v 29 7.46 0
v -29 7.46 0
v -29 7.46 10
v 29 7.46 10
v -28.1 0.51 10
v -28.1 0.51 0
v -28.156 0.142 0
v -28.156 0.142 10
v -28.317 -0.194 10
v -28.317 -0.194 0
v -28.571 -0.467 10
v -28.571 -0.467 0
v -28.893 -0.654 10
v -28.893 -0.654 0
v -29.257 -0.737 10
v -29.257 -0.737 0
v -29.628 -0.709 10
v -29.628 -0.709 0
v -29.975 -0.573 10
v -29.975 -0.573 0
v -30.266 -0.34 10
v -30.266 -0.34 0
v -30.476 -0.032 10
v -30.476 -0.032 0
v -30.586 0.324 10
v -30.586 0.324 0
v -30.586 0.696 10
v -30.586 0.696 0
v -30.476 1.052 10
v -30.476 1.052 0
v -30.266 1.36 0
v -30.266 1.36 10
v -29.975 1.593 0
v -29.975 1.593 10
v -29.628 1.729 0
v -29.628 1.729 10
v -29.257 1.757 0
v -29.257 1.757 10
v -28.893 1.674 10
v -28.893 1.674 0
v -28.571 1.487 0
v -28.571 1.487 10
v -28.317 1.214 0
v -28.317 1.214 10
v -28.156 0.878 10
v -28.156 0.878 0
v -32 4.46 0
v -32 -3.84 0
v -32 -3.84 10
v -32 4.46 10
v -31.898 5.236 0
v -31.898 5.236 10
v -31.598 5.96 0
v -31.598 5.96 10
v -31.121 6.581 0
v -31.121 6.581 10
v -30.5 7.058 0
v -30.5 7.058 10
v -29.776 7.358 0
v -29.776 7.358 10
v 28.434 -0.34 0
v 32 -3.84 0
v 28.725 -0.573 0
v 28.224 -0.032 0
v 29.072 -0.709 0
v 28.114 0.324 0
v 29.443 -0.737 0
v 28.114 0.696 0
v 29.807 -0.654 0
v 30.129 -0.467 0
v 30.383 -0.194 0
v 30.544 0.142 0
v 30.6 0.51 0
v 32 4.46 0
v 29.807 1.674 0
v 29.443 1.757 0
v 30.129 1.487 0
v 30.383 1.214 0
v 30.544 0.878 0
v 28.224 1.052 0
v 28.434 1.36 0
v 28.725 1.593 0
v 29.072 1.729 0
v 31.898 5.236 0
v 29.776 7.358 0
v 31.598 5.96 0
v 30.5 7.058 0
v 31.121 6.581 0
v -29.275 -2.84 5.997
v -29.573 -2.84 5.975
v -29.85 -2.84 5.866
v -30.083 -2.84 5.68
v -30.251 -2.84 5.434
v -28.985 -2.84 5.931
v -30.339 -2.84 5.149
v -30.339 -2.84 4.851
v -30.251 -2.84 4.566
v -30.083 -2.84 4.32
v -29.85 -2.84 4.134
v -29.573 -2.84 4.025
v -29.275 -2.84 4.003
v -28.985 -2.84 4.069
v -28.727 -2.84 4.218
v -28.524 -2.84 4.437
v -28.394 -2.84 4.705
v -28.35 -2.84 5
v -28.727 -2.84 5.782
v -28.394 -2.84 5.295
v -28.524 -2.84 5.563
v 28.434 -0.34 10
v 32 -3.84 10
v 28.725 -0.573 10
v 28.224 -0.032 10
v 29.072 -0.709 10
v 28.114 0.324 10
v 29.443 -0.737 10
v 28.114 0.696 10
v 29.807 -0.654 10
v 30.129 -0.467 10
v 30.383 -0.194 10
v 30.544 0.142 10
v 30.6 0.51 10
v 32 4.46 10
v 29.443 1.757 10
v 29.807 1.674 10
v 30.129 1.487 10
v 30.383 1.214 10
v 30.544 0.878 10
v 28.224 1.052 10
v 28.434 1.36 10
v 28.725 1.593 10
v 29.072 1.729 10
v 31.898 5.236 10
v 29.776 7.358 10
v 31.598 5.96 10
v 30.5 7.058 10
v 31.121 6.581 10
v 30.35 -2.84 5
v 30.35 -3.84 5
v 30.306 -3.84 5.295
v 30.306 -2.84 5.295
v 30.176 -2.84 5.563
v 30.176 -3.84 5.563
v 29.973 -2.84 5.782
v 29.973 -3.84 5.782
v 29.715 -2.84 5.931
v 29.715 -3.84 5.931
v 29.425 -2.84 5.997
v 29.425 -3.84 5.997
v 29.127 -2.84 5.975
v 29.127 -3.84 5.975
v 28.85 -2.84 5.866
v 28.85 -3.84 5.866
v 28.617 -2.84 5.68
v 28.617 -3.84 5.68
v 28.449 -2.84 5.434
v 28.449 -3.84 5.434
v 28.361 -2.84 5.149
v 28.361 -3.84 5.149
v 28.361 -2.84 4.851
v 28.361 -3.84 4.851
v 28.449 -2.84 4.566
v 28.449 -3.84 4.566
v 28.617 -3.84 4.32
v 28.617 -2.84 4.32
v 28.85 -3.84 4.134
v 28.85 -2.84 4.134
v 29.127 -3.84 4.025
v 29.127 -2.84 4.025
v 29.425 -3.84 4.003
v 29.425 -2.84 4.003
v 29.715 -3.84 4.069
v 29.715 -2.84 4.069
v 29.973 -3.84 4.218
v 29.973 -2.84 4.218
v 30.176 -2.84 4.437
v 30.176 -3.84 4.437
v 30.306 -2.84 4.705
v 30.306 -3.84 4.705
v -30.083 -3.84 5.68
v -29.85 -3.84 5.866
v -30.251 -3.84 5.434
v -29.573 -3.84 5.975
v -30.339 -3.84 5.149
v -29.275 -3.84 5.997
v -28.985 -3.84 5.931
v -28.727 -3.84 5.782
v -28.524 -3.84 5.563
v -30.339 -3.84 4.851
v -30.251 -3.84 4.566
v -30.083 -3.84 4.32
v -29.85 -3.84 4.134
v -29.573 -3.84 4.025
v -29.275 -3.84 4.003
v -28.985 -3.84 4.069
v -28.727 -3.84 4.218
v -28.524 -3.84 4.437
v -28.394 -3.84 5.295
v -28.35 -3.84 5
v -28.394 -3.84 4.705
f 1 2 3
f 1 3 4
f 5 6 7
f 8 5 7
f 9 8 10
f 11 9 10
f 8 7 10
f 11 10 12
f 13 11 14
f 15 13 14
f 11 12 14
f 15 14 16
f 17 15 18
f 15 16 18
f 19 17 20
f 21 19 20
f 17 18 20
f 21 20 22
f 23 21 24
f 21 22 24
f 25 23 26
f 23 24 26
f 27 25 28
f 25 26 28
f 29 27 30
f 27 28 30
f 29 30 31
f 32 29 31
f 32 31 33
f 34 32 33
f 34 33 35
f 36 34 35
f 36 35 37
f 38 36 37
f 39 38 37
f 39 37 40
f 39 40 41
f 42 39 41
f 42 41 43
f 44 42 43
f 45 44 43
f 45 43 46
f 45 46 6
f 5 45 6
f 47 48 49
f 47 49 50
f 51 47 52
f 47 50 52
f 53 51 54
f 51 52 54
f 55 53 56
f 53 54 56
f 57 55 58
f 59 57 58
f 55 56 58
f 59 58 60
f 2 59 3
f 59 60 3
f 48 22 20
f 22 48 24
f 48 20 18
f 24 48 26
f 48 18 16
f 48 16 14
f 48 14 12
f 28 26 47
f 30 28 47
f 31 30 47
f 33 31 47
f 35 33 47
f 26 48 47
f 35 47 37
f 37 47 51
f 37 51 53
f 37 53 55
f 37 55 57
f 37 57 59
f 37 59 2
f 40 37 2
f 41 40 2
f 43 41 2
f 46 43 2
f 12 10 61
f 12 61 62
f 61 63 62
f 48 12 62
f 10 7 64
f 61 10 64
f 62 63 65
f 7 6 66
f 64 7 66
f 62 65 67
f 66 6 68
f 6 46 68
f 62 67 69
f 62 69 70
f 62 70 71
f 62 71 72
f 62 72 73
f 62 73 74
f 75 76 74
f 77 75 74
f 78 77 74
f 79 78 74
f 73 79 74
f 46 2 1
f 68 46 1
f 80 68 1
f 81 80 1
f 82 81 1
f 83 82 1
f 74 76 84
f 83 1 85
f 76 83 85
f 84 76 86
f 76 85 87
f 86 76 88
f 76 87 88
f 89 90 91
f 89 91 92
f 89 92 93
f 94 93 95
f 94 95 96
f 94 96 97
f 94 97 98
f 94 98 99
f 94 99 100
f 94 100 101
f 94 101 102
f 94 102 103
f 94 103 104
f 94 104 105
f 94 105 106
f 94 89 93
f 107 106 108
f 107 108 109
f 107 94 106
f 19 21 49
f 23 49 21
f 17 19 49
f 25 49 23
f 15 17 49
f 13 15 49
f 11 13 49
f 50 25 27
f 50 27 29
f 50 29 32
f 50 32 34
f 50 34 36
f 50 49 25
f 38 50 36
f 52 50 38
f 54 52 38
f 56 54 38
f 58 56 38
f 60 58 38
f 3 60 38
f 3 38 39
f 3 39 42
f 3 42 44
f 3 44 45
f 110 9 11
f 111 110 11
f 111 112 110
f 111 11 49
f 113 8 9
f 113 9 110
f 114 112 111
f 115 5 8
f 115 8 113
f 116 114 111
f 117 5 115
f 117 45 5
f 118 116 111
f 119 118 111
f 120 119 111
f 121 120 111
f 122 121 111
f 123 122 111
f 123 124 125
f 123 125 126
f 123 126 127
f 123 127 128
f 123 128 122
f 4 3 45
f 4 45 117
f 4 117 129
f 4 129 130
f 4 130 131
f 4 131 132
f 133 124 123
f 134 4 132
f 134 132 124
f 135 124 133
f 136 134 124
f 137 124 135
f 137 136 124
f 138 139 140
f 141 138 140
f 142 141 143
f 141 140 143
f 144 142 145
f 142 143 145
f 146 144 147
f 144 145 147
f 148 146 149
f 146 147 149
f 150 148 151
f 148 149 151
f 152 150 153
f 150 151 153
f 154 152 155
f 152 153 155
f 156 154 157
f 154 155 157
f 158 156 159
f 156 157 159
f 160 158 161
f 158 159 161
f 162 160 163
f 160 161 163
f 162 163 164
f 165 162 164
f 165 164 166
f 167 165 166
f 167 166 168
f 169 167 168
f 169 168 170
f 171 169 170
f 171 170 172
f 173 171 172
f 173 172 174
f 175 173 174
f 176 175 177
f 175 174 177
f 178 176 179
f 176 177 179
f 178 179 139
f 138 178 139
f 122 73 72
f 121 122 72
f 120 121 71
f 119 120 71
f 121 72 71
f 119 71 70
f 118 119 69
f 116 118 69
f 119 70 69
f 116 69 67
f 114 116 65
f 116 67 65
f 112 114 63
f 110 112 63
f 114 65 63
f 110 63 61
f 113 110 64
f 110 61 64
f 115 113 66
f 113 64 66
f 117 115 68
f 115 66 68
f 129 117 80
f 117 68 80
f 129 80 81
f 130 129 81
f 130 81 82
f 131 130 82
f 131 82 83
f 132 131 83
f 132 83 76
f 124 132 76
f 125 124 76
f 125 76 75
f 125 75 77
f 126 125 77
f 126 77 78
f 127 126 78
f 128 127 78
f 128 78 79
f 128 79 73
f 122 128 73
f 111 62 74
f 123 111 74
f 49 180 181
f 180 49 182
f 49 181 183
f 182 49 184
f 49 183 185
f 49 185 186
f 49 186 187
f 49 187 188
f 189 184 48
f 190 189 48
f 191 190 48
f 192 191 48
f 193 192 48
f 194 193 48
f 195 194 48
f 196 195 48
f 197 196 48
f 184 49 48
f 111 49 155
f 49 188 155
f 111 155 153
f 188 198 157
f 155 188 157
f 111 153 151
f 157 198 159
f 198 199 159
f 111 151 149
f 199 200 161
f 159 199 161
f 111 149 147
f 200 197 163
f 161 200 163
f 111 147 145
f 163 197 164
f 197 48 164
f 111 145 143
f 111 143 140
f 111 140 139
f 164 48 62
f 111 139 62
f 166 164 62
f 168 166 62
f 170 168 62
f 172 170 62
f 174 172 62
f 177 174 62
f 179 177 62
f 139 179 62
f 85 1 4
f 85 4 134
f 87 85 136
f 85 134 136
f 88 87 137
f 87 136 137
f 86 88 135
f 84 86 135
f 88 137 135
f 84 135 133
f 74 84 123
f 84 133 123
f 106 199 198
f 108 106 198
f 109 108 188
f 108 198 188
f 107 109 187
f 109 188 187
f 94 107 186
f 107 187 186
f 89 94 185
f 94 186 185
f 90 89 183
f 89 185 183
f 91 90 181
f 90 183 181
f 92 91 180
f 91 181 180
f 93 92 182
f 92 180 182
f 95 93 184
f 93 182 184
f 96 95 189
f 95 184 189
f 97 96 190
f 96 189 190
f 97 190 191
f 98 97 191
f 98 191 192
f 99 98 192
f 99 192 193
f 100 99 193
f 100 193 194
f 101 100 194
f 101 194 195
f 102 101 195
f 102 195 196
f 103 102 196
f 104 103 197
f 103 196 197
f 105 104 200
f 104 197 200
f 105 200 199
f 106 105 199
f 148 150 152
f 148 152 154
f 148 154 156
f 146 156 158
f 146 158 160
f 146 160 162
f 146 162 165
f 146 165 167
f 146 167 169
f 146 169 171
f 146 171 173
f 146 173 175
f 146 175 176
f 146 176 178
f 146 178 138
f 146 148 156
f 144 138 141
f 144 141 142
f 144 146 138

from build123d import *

# Parameters (mm, degrees)
SKETCH_W        = 64
SKETCH_H        = 11.3
PAD_DEPTH       = 10
SKETCH004_R     = 1
POCKET_DEPTH    = 1
SKETCH006_R     = 1.25
POCKET002_DEPTH = 10.001
FILLET001_R     = 3


with BuildPart() as part:
    # Sketch → Pad (new body)
    with BuildSketch(Plane.XY):
        with Locations((0, 5.65)):
            Rectangle(SKETCH_W, SKETCH_H)
    extrude(amount=PAD_DEPTH)

    # Sketch004 (on Face3 of Pad) → Pocket (cut)
    with BuildSketch(Plane.XZ):
        with Locations((29.35, 5)):
            Circle(SKETCH004_R)
        with Locations((-29.35, 5)):
            Circle(SKETCH004_R)
    extrude(amount=-POCKET_DEPTH, mode=Mode.SUBTRACT)

    # Sketch006 (on Face4 of Pocket) → Pocket002 (cut, through all)
    with BuildSketch(Plane(origin=(0, 0, 0), x_dir=(1, 0, 0), z_dir=(0, 0, -1))):
        with Locations((29.35, -4.35)):
            Circle(SKETCH006_R)
        with Locations((-29.35, -4.35)):
            Circle(SKETCH006_R)
    extrude(amount=-POCKET002_DEPTH, mode=Mode.SUBTRACT)

    # Fillet001
    fillet001_edges = [part.edges().sort_by_distance(p)[0] for p in [
        (-32, 11.3, 5),
        (32, 11.3, 5),
    ]]
    fillet(fillet001_edges, radius=FILLET001_R)


with BuildPart() as part_1:
    # Body placement: moved
    add(part.part.moved(Location((0, -3.84, 0))))


solid = part_1.part
